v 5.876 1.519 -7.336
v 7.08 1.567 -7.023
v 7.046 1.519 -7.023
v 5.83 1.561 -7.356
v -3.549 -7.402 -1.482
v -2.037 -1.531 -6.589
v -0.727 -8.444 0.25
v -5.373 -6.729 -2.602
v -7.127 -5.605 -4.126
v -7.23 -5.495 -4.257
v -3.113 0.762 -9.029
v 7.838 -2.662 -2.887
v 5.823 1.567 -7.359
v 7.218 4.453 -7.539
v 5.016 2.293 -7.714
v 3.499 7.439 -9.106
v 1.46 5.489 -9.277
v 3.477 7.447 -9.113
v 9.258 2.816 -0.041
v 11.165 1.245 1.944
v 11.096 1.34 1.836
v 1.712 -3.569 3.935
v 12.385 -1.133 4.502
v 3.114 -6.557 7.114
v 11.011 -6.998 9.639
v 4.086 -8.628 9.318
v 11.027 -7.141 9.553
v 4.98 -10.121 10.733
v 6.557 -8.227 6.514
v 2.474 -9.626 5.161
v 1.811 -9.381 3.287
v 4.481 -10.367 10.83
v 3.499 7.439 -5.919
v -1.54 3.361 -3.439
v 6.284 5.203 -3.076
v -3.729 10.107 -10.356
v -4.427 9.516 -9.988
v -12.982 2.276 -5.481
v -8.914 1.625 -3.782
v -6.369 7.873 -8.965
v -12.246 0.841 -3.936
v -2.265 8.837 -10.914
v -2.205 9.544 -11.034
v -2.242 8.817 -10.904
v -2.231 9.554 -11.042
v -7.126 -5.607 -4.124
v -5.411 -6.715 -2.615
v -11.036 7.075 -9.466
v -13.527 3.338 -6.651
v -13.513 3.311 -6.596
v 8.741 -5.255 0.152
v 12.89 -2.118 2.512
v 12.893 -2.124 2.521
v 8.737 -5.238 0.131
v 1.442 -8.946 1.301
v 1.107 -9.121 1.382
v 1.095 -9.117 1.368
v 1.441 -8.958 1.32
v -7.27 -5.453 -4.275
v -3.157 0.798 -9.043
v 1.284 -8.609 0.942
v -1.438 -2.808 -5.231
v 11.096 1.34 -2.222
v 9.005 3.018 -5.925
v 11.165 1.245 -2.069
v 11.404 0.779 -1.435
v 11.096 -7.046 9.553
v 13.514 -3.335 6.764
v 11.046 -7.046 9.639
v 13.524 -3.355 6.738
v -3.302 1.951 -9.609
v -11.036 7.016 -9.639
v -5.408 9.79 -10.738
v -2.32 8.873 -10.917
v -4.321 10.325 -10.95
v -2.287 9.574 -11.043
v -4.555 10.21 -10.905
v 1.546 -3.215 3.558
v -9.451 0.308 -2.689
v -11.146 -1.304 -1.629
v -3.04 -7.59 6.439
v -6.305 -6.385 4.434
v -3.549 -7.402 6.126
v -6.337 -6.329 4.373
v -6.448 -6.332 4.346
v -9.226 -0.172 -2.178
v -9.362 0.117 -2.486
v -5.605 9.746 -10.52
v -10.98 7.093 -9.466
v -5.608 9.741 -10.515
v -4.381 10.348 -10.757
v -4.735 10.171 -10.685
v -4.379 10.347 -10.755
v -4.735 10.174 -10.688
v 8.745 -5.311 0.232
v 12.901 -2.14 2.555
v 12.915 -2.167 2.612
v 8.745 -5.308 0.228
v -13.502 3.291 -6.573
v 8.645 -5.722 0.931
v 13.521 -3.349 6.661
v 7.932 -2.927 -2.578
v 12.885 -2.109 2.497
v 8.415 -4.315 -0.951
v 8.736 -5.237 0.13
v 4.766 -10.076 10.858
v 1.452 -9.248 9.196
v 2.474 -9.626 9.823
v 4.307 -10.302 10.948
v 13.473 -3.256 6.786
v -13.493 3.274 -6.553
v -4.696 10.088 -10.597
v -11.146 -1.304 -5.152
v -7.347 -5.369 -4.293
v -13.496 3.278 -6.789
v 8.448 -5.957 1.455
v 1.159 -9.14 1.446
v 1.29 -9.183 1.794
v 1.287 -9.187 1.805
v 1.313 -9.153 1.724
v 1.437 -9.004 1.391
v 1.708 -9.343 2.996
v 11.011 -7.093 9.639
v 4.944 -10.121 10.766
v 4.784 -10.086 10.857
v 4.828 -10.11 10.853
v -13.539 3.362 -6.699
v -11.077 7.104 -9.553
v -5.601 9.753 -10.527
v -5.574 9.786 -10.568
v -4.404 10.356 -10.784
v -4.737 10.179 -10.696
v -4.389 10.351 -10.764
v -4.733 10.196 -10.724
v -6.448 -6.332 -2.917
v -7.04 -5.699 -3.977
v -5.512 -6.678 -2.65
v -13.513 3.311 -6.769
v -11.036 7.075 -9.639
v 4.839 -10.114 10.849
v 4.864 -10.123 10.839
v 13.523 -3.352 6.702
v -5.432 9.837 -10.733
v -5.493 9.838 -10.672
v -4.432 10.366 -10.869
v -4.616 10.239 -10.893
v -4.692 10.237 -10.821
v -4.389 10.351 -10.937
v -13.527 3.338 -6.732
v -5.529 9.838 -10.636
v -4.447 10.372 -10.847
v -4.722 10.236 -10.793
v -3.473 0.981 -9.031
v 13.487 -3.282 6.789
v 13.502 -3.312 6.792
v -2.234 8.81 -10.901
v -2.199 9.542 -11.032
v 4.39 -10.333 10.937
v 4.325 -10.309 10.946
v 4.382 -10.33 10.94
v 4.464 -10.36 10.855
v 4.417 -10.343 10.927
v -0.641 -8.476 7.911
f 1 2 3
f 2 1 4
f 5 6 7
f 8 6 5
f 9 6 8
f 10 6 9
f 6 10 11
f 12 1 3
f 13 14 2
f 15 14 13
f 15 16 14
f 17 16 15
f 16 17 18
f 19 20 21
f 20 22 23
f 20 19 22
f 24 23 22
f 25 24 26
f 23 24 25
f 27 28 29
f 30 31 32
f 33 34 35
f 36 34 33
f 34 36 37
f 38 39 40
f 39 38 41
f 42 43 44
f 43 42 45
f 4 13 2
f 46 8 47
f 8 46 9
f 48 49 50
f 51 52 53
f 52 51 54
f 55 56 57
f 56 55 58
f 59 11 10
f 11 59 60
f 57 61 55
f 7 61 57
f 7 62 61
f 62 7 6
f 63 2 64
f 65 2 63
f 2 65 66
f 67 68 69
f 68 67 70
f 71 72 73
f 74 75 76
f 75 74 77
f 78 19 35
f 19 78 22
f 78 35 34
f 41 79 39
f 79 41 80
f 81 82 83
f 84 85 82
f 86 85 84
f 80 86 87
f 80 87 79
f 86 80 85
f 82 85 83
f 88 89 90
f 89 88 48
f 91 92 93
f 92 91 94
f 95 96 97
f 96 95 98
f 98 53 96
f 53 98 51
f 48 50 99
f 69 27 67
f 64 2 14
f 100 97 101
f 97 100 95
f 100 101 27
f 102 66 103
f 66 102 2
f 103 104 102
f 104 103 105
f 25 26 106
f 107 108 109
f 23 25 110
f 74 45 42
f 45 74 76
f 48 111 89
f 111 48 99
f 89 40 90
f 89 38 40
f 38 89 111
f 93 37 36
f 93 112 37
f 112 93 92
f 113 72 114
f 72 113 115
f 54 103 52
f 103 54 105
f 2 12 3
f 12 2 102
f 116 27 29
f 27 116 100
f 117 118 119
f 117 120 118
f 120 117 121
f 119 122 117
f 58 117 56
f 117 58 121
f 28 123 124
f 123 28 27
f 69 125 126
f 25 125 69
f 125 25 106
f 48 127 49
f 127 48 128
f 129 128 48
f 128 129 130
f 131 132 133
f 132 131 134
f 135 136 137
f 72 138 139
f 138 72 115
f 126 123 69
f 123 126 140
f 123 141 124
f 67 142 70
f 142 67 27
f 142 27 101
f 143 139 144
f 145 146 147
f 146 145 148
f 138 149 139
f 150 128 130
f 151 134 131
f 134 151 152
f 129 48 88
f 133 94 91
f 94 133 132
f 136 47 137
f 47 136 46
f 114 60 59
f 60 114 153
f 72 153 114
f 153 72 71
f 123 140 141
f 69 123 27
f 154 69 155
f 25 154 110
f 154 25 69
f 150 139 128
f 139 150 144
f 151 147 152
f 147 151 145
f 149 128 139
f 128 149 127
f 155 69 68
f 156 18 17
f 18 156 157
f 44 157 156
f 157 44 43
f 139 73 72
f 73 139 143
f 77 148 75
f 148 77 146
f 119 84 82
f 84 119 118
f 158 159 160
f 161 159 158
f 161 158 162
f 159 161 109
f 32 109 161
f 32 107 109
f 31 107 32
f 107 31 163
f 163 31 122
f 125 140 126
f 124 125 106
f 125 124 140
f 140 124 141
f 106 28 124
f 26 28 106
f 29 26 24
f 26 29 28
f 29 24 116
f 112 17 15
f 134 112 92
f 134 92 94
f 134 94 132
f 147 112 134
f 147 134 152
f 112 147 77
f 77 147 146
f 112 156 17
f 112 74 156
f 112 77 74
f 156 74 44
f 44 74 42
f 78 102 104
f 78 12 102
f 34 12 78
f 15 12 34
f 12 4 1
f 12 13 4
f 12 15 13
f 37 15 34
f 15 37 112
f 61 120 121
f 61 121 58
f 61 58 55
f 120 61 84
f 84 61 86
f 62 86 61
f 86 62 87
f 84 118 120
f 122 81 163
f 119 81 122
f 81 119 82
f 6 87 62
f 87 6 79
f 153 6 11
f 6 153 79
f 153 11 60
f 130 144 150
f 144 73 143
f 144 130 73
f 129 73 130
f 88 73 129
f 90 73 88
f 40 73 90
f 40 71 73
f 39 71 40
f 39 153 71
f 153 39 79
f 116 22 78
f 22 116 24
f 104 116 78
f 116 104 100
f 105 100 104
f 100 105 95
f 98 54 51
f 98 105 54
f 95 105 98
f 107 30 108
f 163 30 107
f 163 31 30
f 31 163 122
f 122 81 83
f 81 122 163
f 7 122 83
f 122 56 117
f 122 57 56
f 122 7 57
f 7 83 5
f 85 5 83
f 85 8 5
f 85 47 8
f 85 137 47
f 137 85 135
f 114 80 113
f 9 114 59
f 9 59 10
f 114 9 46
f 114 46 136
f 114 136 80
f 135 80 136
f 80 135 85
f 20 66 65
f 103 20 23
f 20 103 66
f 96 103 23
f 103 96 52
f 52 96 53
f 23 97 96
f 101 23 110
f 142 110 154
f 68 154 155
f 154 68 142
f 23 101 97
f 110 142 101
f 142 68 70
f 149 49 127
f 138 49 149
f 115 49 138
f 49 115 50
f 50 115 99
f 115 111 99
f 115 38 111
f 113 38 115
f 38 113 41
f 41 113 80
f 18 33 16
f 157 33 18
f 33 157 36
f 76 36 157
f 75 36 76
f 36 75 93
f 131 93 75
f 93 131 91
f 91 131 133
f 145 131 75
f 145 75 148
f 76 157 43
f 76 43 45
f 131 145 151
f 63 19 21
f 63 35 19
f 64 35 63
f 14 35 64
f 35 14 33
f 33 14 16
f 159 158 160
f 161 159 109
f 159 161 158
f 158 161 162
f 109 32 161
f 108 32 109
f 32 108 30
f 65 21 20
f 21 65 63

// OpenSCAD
// Auto-generated OpenSCAD file

    inner_points = 10*[[-1.4436247026081666, 0.53290472179478, 0.5000000000005375], [1.4436191328390864, -0.5329090469609368, -0.5000000000005375], [-1.1065387952767085, -0.12450860318088203, 1.1739293814812473], [-1.2292961042735038, 0.9867657297769106, -0.36491238710543017], [1.2292905345044236, -0.9867700549430674, 0.36491238710543017], [1.1065332255076283, 0.12450427801472524, -1.1739293814812473], [-0.3467937417511487, -0.7343646996664531, 1.3994576396282619], [-0.5454192400754369, 1.0637149418846232, -1.0904406452529822], [0.5454136703063569, -1.06371926705078, 1.0904406452529822], [0.3467881719820686, 0.7343603745002963, -1.3994576396282619], [-0.9737754103851414, 0.030062411297536226, -0.22552825814749344], [0.4698465073384851, -0.5028444730803222, -0.7255282581480309], [-0.6366895030536831, -0.6273509136781259, 0.44840112333321624], [0.25551790900382226, -0.9567054810624528, 0.13938412895793664], [-0.28989854618707456, 0.10701162340524878, -0.9510565162950456]];

    outer_points = 10*[[1.5631233177982589, 0.0, 0.4179467455373456], [-1.5631233177982589, 0.0, -0.4179467455373456], [1.4296084444676138, 0.7045531263704787, -0.27903149710806596], [1.0995782123374722, -0.7045531263704787, 0.9552835368748945], [-1.0995782123374722, 0.7045531263704787, -0.9552835368748945], [-1.4296084444676138, -0.7045531263704787, 0.27903149710806596], [0.750031735954207, 1.1399909053474344, -0.8694291917899644], [0.2160316030526203, -1.1399909053474344, 1.1277344860194474], [-0.2160316030526203, 1.1399909053474344, -1.1277344860194474], [-0.750031735954207, -1.1399909053474344, 0.8694291917899644], [0.8365540911892785, -0.5478743958362549, 0.0033013484425665762], [-0.7265692266089804, -0.5478743958362549, -0.41464539709477904], [0.7030392178586335, 0.1566787305342239, -0.6936768942028451], [-0.26302412114819385, 0.1566787305342239, -0.9519821884323281], [-0.04699251809557352, -0.9833121748132105, 0.1757522975871193]];

    // Convex hull for inner set (I)
    module inner_hull() {
        hull() {
            for (p = inner_points) {
                translate(p) sphere(r=0.1);
            }
        }
    }

    // Convex hull for outer set (O) minus inner hull (O \ I)
    module outer_minus_inner() {
        difference() {
            hull() {
                for (p = outer_points) {
                    translate(p) sphere(r=0.1);
                }
            }
            inner_hull(); // Subtract inner hull
        }
    }

    // Convex hull for outer set (O) minus all translated inner hulls
    module outer_minus_AllTranslationInner() {
        difference() {
            hull() {
                for (p = outer_points) {
                    translate(p) sphere(r=0.1);
                }
            }
            hull() {
                translate([0,0,50]) inner_hull();
                translate([0,0,-50]) inner_hull();
            }; // Subtract translated inner hulls
        }
    }

    // Difference between outer_minus_inner and outer_minus_AllTranslationInner
    module outer_minus_inner_diff() {
        difference() {
            // Outer minus inner
            difference() {
                hull() {
                    for (p = outer_points) {
                        translate(p) sphere(r=0.1);
                    }
                }
                inner_hull();
            }

            // Subtract Outer minus AllTranslationInner
            difference() {
                hull() {
                    for (p = outer_points) {
                        translate(p) sphere(r=0.1);
                    }
                }
                hull() {
                    translate([0,0,50]) inner_hull();
                    translate([0,0,-50]) inner_hull();
                };
            }
        }
    }

    // Rendering all with colors applied
    color([1, 1, 0, 1]) outer_minus_inner_diff(); // Opaque yellow
    
